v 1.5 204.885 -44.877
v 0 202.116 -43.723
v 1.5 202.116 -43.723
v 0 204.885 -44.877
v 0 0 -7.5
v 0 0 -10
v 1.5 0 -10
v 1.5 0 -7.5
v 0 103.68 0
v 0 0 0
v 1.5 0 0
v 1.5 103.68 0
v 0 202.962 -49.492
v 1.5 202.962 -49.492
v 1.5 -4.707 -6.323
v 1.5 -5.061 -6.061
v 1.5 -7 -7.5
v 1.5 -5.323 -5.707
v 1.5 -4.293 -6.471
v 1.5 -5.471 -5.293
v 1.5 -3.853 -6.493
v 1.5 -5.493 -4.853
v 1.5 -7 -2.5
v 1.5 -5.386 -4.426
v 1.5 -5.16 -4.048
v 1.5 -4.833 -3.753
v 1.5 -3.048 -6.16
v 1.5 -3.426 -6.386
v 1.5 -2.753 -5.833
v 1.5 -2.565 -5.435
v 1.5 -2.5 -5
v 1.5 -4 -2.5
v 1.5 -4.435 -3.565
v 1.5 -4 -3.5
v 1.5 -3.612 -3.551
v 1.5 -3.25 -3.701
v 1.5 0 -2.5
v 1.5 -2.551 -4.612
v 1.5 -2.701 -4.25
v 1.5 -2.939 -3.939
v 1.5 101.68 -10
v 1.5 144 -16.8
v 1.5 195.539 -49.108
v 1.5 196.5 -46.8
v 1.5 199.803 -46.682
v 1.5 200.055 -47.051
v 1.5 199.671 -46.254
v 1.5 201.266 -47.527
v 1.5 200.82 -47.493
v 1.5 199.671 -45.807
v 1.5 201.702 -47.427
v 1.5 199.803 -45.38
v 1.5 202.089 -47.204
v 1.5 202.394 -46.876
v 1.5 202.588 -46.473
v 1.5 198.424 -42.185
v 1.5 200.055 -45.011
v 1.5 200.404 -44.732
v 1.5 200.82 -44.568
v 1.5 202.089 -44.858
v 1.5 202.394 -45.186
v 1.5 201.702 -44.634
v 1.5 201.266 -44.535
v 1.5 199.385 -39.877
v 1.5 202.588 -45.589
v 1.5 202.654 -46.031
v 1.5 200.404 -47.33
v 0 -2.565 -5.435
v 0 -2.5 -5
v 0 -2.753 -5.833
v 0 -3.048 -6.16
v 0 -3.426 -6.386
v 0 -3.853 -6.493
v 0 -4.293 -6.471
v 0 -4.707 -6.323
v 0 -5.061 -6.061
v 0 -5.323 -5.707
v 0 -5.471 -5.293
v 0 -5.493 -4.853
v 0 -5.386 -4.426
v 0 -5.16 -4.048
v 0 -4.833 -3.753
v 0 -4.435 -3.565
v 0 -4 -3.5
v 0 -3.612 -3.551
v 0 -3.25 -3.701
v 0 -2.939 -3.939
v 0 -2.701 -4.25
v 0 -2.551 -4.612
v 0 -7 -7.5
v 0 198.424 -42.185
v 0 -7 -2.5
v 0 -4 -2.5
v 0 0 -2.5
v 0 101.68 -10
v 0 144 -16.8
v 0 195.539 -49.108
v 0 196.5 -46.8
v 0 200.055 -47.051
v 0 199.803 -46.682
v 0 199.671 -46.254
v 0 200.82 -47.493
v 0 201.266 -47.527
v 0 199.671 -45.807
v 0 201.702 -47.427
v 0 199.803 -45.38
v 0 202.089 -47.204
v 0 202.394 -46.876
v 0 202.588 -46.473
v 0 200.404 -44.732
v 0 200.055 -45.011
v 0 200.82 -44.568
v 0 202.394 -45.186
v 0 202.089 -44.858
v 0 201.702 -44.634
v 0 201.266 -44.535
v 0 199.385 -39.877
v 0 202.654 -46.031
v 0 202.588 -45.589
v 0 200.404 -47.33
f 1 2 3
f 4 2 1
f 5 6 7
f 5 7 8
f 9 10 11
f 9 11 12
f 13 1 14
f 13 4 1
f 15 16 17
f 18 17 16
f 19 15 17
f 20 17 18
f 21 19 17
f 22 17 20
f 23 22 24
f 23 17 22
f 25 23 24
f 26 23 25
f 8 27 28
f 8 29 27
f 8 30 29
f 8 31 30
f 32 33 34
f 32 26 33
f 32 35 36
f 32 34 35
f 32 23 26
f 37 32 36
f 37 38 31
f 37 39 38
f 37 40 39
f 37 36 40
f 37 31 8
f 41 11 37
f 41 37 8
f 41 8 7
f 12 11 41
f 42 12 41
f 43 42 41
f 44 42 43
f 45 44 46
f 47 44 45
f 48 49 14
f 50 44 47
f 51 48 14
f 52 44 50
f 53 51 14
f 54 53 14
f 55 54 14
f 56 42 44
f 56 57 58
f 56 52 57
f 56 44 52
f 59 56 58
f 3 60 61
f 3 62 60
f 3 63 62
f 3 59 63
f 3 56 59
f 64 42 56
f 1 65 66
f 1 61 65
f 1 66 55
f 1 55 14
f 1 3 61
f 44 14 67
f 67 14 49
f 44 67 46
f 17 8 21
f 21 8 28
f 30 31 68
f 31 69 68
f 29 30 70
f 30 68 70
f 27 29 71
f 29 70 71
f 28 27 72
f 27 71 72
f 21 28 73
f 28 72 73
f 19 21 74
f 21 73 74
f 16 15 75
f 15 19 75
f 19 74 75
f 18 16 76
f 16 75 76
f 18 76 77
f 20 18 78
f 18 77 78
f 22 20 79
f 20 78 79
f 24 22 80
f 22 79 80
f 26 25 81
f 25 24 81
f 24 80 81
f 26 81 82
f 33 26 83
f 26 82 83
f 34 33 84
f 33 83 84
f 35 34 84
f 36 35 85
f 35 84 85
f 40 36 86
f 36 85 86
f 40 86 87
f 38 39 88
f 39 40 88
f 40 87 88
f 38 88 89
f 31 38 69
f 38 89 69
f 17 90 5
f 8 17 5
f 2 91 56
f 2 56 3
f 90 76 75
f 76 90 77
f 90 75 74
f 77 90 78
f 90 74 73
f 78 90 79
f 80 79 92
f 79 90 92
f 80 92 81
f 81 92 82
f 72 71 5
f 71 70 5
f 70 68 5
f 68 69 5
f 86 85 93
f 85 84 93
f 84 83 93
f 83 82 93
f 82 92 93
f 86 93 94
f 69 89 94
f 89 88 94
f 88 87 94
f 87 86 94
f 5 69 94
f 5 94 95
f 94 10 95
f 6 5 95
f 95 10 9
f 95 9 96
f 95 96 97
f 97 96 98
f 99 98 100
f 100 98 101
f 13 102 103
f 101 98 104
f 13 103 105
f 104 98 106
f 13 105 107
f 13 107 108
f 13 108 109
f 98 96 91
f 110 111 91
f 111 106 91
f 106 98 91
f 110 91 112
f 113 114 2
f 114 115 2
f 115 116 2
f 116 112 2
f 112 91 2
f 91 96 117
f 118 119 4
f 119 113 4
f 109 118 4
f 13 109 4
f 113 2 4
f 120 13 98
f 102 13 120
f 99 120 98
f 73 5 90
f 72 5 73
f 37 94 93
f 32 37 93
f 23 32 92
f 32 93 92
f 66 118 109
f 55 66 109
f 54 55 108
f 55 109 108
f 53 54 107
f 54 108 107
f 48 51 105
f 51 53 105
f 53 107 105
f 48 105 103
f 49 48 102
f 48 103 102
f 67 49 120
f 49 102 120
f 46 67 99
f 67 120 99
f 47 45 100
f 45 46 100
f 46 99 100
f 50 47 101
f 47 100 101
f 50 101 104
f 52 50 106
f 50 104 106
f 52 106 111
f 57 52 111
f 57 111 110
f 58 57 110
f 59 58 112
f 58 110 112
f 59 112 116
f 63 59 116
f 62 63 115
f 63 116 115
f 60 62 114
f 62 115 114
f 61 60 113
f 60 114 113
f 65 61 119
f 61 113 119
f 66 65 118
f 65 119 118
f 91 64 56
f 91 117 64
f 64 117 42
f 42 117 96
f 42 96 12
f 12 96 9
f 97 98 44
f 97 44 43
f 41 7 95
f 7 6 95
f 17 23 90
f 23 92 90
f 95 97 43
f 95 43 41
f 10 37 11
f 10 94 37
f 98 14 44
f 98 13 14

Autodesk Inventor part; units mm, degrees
ref_plane "YZ Plane" through (0, 0, 0) normal (1, 0, 0) x (0, 1, 0)
ref_plane "XZ Plane" through (0, 0, 0) normal (0, 1, 0) x (-1, 0, 0)
ref_plane "XY Plane" through (0, 0, 0) normal (0, 0, 1) x (1, 0, 0)
sketch "Sketch2" plane through (0, 0, 0) normal (1, 0, 0) x (0, 1, 0)
  line L0 (0, 4) -> (60, 4)
  line L1 (0, 0) -> (60, 0)
  line L2 (0, -61) -> (0, 14)
  line L3 (96.4802, -36) -> (98.4802, -26)
  line L4 (96.4802, -36) -> (110.2083, 32.6406)
  line L5 (0, 0) -> (103.6802, 0)
  line L6 (0, 0) -> (0, -10)
  line L7 (0, -10) -> (101.6802, -10)
  line L8 (0, 0) -> (0, -2.5)
  line L9 (0, -2.5) -> (-7, -2.5)
  line L10 (-7, -2.5) -> (-7, -7.5)
  line L11 (-7, -7.5) -> (0, -7.5)
  line L12 (0, -2.5) -> (-4, -2.5)
  line L13 (-4, -2.5) -> (-4, -5)
  circle A0 centre (-4, -5) radius 1.5
  line L14 (198.4235, -42.1847) -> (202.1158, -43.7232)
  line L15 (204.885, -44.877) -> (202.9619, -49.4924)
  line L16 (198.4235, -42.1847) -> (204.885, -44.877)
  line L17 (202.9619, -49.4924) -> (196.5004, -46.8001)
  circle A1 centre (201.1542, -46.0308) radius 1.5
  line L18 (199.385, -39.877) -> (195.5388, -49.1078)
  line L19 (199.385, -39.877) -> (144.0004, -16.8001)
  line L20 (195.5388, -49.1078) -> (101.6802, -10)
  line L21 (199.385, -39.877) -> (103.6802, 0)
  point P0 (0, -7.5)
  dimension "d10" = 70
  dimension "d11" = 10
  dimension "d12" = 2.5
  dimension "d13" = 7
  dimension "d14" = 5
  dimension "d15" = 4
  dimension "d16" = 2.5
  dimension "d17" = 3
extrude "Extrusion2" add sketch "Sketch2" along normal blind 1.5
properties part number "MotorSupport"
